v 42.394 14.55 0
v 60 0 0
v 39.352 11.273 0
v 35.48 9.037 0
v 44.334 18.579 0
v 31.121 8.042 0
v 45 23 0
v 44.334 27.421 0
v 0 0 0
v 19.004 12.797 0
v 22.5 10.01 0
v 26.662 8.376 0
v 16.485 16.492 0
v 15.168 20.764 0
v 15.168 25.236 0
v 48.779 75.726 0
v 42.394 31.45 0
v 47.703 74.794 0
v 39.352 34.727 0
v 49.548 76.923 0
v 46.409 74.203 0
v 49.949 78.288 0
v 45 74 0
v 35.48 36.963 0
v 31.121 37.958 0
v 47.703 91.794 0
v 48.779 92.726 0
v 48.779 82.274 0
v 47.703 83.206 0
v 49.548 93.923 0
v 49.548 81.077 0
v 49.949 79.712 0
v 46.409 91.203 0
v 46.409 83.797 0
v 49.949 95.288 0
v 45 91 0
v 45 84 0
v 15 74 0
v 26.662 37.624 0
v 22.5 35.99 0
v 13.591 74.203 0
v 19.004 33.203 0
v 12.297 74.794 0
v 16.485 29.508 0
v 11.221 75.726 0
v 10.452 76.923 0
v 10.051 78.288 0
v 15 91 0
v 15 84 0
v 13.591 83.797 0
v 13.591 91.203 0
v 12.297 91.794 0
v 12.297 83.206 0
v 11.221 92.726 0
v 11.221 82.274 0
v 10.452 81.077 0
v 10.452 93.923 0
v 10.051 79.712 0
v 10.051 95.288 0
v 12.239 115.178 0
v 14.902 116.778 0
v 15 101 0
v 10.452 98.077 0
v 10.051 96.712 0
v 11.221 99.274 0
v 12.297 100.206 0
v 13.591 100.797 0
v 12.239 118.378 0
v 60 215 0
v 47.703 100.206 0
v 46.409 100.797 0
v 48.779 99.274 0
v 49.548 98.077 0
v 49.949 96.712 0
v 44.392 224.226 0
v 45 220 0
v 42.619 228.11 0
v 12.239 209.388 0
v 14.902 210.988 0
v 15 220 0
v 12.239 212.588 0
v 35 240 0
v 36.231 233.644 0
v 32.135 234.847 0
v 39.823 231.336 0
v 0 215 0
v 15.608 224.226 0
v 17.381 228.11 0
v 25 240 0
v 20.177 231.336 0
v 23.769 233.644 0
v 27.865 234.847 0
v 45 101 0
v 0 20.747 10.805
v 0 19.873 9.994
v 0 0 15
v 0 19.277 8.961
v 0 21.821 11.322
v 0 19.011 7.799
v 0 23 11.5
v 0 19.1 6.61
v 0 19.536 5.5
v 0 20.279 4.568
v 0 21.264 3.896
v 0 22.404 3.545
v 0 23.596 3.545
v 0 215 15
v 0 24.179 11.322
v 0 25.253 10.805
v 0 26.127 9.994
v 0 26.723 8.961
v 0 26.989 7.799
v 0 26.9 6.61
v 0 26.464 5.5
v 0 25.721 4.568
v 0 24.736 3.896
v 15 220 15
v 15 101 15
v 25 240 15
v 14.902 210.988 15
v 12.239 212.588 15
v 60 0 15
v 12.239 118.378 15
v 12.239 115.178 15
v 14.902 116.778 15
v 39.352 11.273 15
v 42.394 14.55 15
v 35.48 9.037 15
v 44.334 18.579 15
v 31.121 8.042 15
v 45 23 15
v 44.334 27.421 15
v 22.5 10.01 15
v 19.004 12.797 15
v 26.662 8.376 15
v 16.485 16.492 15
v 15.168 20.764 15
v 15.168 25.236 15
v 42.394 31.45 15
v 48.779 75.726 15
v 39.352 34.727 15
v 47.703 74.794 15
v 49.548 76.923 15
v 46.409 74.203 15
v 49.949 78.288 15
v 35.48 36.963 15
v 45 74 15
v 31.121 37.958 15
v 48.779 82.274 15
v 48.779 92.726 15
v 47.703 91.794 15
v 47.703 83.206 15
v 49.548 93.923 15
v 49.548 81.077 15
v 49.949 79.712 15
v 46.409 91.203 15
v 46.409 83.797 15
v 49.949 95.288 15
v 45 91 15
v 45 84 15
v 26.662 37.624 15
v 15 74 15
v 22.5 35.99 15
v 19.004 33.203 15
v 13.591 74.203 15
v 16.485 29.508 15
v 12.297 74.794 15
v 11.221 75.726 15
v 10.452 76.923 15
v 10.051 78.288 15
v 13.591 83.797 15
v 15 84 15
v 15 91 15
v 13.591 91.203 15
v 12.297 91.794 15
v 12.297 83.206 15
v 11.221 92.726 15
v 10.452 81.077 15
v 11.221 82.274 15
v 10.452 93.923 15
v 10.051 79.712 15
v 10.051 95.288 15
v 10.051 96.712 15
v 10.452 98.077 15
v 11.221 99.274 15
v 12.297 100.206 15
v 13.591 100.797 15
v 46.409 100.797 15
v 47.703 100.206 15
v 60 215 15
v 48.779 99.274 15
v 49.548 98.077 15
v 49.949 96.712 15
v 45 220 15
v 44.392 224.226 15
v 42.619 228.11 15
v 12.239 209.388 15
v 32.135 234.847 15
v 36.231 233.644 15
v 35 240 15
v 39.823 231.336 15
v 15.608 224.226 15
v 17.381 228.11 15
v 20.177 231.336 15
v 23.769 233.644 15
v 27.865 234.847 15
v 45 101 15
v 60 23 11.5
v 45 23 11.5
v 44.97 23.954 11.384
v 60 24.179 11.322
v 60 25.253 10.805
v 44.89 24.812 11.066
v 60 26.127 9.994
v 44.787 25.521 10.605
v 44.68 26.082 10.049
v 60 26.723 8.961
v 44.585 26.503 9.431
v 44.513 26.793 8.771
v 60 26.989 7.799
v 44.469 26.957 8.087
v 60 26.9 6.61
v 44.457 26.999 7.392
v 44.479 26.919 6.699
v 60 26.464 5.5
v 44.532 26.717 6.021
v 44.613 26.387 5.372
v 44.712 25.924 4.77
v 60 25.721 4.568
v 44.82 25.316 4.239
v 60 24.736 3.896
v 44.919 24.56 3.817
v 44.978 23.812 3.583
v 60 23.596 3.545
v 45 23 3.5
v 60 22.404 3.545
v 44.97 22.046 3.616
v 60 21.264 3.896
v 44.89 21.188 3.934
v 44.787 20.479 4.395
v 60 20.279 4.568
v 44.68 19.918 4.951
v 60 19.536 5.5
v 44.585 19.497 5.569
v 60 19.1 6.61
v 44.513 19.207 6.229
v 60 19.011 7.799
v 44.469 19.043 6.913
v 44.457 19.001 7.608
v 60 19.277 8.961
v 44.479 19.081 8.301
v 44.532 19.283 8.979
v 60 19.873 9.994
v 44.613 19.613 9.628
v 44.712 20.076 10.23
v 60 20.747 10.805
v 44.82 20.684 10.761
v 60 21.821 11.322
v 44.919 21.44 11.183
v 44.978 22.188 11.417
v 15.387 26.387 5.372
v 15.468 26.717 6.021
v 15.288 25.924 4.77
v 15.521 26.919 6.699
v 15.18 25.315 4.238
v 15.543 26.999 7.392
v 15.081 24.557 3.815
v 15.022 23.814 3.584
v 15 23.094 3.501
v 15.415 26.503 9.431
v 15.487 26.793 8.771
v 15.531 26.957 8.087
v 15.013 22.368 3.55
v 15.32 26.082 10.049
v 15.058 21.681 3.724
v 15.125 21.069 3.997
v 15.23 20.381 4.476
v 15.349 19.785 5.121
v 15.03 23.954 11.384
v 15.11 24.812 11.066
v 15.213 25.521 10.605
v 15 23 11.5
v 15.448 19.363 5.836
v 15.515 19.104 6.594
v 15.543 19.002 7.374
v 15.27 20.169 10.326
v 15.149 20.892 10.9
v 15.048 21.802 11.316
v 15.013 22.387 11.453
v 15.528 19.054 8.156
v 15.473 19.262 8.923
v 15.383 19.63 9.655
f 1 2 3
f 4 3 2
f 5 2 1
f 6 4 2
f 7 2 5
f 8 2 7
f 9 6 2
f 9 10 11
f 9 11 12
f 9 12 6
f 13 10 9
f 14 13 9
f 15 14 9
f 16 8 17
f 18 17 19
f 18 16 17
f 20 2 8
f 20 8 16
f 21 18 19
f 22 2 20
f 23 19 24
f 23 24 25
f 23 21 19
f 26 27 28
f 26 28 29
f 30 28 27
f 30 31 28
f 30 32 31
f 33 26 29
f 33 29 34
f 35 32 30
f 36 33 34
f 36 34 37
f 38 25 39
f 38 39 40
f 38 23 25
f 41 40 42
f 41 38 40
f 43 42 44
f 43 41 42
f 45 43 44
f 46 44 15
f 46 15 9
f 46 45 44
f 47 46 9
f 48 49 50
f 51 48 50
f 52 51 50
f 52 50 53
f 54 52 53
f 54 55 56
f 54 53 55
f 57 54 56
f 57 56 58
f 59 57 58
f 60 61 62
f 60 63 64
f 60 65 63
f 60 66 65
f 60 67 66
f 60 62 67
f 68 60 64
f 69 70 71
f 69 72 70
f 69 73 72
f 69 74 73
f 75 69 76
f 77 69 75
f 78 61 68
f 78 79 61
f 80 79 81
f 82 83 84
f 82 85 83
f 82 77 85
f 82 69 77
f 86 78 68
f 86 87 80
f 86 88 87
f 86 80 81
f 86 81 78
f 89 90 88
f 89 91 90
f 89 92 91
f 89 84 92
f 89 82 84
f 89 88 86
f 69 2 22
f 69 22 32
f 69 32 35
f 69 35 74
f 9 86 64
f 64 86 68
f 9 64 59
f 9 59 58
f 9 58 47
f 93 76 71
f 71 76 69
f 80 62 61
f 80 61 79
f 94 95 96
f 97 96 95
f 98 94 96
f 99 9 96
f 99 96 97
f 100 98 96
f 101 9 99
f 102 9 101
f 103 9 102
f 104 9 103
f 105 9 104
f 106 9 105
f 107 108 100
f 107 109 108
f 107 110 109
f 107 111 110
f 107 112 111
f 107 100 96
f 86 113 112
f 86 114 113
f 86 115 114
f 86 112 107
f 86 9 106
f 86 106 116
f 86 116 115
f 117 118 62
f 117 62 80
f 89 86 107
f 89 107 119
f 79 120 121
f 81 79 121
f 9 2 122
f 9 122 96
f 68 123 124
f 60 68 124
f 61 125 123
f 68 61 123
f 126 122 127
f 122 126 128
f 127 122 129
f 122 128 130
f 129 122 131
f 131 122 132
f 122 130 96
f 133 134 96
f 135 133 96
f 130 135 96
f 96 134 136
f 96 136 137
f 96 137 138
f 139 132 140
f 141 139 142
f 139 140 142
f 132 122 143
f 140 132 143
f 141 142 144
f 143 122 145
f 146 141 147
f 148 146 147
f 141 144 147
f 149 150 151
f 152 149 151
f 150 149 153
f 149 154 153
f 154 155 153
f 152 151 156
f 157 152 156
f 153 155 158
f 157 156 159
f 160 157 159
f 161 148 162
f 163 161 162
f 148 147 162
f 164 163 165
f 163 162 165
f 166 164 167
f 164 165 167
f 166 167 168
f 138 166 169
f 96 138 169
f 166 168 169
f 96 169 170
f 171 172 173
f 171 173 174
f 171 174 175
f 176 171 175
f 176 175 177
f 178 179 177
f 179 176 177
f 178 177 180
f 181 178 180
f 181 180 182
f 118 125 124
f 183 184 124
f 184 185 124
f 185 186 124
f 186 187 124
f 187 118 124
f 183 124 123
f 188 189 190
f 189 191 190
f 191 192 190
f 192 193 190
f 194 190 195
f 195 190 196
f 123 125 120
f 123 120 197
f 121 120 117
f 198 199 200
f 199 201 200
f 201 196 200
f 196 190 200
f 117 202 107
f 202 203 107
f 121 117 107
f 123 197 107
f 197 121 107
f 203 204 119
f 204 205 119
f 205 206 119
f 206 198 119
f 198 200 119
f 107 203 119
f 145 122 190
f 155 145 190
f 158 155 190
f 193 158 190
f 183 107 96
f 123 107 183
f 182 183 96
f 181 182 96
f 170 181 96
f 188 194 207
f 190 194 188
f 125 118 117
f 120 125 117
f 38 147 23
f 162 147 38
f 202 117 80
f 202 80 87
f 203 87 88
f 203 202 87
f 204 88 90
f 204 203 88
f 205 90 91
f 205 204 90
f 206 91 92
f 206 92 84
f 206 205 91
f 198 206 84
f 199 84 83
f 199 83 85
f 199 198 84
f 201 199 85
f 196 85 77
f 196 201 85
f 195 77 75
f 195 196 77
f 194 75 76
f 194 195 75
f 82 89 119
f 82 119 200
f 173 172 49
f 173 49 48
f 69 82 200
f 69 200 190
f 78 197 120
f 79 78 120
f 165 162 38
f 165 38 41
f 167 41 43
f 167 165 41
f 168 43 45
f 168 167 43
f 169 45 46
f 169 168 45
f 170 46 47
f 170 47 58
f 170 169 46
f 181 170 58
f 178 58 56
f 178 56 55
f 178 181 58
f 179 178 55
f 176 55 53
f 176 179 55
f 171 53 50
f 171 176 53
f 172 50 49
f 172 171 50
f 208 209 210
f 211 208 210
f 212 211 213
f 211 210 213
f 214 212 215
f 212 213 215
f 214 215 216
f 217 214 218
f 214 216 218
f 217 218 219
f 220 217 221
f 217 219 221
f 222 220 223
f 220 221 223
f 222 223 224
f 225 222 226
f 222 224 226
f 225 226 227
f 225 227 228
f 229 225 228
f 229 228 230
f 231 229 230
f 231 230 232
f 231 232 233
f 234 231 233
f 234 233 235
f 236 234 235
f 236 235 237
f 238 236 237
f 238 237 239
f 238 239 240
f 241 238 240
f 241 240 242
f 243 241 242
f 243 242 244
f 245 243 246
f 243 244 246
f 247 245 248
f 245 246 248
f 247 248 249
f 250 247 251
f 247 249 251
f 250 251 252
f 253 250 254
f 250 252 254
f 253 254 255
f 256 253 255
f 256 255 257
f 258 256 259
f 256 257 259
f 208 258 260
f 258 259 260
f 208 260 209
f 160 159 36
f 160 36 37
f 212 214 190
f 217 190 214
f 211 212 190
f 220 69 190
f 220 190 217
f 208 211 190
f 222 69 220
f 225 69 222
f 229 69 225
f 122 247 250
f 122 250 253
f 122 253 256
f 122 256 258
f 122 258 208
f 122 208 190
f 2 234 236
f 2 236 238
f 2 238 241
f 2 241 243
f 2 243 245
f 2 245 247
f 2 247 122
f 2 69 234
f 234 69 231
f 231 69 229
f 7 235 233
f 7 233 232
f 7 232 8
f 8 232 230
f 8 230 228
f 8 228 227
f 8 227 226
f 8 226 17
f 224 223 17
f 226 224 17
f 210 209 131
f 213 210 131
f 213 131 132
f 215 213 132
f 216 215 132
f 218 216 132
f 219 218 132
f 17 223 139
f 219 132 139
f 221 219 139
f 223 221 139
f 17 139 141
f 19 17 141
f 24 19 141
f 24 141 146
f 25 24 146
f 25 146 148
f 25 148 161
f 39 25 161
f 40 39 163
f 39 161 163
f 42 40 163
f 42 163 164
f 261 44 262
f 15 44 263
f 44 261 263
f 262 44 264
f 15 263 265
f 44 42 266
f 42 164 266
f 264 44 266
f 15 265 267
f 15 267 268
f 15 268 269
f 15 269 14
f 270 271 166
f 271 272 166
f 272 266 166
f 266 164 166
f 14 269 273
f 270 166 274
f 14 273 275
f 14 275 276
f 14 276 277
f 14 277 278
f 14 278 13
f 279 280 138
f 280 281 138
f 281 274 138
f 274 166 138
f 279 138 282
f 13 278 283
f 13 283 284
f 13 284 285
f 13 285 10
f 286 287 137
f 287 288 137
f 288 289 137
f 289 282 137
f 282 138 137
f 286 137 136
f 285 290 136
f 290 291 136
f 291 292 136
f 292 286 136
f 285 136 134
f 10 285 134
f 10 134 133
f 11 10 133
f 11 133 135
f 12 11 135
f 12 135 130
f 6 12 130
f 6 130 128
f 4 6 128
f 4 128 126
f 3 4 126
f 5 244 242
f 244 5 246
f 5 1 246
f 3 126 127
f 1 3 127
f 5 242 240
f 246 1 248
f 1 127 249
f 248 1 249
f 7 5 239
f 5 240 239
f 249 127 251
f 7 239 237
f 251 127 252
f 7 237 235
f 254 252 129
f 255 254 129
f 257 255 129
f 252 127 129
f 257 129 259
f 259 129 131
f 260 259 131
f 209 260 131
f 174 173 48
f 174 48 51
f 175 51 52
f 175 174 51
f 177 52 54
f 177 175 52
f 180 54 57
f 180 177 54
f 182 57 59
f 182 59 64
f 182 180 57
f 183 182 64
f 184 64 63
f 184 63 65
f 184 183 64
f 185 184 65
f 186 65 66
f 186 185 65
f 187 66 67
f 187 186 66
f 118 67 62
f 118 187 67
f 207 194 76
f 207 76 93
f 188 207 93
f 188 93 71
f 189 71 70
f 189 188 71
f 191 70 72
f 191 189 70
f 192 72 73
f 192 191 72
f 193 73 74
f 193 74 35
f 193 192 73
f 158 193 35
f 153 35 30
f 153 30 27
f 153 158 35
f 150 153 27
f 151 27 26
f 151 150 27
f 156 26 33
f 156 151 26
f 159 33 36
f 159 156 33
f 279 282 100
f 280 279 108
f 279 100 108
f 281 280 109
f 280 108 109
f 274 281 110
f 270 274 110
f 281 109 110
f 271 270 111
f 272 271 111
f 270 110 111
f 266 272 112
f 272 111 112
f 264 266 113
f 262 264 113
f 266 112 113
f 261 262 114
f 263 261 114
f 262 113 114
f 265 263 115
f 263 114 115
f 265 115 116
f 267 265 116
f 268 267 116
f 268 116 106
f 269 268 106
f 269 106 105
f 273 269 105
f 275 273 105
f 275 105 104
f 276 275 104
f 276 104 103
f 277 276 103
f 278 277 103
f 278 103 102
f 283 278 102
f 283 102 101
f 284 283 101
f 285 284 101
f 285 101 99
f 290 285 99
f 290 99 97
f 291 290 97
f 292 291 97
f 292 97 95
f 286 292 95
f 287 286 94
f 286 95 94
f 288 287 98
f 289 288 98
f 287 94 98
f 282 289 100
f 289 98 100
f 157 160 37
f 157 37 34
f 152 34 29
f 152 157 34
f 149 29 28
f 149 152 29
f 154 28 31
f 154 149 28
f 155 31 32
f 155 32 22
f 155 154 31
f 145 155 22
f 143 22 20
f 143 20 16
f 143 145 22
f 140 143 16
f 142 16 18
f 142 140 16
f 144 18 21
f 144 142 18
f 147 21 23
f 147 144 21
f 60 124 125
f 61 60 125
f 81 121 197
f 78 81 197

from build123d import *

# Parameters (mm, degrees)
BASE_EXTRUSION_DEPTH       = 15
ESQUISSE2_R                = 15
ENL_V_MAT_EXTRU_1_DEPTH    = 15
ENL_V_MAT_EXTRU_2_DEPTH    = 15
ESQUISSE4_R                = 4
ENL_V_MAT_EXTRU_3_DEPTH    = 248.840674628
ENL_V_MAT_EXTRU_4_DEPTH    = 248.840674658
R_P_TITION_LIN_AIRE1_COUNT = 2
R_P_TITION_LIN_AIRE1_PITCH = 94.21


with BuildPart() as part:
    # Esquisse1 → Base-Extrusion (new body)
    with BuildSketch(Plane.XY):
        Polygon((0, 215), (25, 240), (35, 240), (60, 215), (60, 0), (0, 0), align=None)
    extrude(amount=BASE_EXTRUSION_DEPTH)

    # Esquisse2 → Enlèv. mat.-Extru.1 (cut)
    with BuildSketch(Plane.XY.offset(15)):
        with Locations((30, 23)):
            Circle(ESQUISSE2_R)
    extrude(amount=-ENL_V_MAT_EXTRU_1_DEPTH, mode=Mode.SUBTRACT)

    # Esquisse3 → Enlèv. mat.-Extru.2 (cut)
    with BuildSketch(Plane.XY.offset(15)):
        with BuildLine():
            Line((45, 91), (45, 84))
            ThreePointArc((45, 84), (50, 79), (45, 74))
            Line((45, 74), (15, 74))
            ThreePointArc((15, 74), (10, 79), (15, 84))
            Line((15, 84), (15, 91))
            ThreePointArc((15, 91), (10, 96), (15, 101))
            Line((15, 101), (15, 220))
            ThreePointArc((15, 220), (30, 235), (45, 220))
            Line((45, 220), (45, 101))
            ThreePointArc((45, 101), (50, 96), (45, 91))
        make_face()
    extrude(amount=-ENL_V_MAT_EXTRU_2_DEPTH, mode=Mode.SUBTRACT)

    # Esquisse4 → Enlèv. mat.-Extru.3 (cut, through all)
    with BuildSketch(Plane.ZY):
        with Locations((7.5, 23)):
            Circle(ESQUISSE4_R)
    extrude(amount=-ENL_V_MAT_EXTRU_3_DEPTH, mode=Mode.SUBTRACT)

    # Esquisse5 → Enlèv. mat.-Extru.4 (cut, through all)
    with BuildSketch(Plane.XY.offset(15)):
        Polygon((14.902218658, 116.777944848), (12.23927057, 118.377944848), (12.23927057, 115.177944848), align=None)
    enl_v_mat_extru_4 = extrude(amount=-ENL_V_MAT_EXTRU_4_DEPTH, mode=Mode.SUBTRACT)

    # Répétition linéaire1: Enlèv. mat.-Extru.4 ×2
    with Locations(*[(0, i * R_P_TITION_LIN_AIRE1_PITCH, 0) for i in range(1, R_P_TITION_LIN_AIRE1_COUNT)]):
        add(enl_v_mat_extru_4, mode=Mode.SUBTRACT)


solid = part.part
